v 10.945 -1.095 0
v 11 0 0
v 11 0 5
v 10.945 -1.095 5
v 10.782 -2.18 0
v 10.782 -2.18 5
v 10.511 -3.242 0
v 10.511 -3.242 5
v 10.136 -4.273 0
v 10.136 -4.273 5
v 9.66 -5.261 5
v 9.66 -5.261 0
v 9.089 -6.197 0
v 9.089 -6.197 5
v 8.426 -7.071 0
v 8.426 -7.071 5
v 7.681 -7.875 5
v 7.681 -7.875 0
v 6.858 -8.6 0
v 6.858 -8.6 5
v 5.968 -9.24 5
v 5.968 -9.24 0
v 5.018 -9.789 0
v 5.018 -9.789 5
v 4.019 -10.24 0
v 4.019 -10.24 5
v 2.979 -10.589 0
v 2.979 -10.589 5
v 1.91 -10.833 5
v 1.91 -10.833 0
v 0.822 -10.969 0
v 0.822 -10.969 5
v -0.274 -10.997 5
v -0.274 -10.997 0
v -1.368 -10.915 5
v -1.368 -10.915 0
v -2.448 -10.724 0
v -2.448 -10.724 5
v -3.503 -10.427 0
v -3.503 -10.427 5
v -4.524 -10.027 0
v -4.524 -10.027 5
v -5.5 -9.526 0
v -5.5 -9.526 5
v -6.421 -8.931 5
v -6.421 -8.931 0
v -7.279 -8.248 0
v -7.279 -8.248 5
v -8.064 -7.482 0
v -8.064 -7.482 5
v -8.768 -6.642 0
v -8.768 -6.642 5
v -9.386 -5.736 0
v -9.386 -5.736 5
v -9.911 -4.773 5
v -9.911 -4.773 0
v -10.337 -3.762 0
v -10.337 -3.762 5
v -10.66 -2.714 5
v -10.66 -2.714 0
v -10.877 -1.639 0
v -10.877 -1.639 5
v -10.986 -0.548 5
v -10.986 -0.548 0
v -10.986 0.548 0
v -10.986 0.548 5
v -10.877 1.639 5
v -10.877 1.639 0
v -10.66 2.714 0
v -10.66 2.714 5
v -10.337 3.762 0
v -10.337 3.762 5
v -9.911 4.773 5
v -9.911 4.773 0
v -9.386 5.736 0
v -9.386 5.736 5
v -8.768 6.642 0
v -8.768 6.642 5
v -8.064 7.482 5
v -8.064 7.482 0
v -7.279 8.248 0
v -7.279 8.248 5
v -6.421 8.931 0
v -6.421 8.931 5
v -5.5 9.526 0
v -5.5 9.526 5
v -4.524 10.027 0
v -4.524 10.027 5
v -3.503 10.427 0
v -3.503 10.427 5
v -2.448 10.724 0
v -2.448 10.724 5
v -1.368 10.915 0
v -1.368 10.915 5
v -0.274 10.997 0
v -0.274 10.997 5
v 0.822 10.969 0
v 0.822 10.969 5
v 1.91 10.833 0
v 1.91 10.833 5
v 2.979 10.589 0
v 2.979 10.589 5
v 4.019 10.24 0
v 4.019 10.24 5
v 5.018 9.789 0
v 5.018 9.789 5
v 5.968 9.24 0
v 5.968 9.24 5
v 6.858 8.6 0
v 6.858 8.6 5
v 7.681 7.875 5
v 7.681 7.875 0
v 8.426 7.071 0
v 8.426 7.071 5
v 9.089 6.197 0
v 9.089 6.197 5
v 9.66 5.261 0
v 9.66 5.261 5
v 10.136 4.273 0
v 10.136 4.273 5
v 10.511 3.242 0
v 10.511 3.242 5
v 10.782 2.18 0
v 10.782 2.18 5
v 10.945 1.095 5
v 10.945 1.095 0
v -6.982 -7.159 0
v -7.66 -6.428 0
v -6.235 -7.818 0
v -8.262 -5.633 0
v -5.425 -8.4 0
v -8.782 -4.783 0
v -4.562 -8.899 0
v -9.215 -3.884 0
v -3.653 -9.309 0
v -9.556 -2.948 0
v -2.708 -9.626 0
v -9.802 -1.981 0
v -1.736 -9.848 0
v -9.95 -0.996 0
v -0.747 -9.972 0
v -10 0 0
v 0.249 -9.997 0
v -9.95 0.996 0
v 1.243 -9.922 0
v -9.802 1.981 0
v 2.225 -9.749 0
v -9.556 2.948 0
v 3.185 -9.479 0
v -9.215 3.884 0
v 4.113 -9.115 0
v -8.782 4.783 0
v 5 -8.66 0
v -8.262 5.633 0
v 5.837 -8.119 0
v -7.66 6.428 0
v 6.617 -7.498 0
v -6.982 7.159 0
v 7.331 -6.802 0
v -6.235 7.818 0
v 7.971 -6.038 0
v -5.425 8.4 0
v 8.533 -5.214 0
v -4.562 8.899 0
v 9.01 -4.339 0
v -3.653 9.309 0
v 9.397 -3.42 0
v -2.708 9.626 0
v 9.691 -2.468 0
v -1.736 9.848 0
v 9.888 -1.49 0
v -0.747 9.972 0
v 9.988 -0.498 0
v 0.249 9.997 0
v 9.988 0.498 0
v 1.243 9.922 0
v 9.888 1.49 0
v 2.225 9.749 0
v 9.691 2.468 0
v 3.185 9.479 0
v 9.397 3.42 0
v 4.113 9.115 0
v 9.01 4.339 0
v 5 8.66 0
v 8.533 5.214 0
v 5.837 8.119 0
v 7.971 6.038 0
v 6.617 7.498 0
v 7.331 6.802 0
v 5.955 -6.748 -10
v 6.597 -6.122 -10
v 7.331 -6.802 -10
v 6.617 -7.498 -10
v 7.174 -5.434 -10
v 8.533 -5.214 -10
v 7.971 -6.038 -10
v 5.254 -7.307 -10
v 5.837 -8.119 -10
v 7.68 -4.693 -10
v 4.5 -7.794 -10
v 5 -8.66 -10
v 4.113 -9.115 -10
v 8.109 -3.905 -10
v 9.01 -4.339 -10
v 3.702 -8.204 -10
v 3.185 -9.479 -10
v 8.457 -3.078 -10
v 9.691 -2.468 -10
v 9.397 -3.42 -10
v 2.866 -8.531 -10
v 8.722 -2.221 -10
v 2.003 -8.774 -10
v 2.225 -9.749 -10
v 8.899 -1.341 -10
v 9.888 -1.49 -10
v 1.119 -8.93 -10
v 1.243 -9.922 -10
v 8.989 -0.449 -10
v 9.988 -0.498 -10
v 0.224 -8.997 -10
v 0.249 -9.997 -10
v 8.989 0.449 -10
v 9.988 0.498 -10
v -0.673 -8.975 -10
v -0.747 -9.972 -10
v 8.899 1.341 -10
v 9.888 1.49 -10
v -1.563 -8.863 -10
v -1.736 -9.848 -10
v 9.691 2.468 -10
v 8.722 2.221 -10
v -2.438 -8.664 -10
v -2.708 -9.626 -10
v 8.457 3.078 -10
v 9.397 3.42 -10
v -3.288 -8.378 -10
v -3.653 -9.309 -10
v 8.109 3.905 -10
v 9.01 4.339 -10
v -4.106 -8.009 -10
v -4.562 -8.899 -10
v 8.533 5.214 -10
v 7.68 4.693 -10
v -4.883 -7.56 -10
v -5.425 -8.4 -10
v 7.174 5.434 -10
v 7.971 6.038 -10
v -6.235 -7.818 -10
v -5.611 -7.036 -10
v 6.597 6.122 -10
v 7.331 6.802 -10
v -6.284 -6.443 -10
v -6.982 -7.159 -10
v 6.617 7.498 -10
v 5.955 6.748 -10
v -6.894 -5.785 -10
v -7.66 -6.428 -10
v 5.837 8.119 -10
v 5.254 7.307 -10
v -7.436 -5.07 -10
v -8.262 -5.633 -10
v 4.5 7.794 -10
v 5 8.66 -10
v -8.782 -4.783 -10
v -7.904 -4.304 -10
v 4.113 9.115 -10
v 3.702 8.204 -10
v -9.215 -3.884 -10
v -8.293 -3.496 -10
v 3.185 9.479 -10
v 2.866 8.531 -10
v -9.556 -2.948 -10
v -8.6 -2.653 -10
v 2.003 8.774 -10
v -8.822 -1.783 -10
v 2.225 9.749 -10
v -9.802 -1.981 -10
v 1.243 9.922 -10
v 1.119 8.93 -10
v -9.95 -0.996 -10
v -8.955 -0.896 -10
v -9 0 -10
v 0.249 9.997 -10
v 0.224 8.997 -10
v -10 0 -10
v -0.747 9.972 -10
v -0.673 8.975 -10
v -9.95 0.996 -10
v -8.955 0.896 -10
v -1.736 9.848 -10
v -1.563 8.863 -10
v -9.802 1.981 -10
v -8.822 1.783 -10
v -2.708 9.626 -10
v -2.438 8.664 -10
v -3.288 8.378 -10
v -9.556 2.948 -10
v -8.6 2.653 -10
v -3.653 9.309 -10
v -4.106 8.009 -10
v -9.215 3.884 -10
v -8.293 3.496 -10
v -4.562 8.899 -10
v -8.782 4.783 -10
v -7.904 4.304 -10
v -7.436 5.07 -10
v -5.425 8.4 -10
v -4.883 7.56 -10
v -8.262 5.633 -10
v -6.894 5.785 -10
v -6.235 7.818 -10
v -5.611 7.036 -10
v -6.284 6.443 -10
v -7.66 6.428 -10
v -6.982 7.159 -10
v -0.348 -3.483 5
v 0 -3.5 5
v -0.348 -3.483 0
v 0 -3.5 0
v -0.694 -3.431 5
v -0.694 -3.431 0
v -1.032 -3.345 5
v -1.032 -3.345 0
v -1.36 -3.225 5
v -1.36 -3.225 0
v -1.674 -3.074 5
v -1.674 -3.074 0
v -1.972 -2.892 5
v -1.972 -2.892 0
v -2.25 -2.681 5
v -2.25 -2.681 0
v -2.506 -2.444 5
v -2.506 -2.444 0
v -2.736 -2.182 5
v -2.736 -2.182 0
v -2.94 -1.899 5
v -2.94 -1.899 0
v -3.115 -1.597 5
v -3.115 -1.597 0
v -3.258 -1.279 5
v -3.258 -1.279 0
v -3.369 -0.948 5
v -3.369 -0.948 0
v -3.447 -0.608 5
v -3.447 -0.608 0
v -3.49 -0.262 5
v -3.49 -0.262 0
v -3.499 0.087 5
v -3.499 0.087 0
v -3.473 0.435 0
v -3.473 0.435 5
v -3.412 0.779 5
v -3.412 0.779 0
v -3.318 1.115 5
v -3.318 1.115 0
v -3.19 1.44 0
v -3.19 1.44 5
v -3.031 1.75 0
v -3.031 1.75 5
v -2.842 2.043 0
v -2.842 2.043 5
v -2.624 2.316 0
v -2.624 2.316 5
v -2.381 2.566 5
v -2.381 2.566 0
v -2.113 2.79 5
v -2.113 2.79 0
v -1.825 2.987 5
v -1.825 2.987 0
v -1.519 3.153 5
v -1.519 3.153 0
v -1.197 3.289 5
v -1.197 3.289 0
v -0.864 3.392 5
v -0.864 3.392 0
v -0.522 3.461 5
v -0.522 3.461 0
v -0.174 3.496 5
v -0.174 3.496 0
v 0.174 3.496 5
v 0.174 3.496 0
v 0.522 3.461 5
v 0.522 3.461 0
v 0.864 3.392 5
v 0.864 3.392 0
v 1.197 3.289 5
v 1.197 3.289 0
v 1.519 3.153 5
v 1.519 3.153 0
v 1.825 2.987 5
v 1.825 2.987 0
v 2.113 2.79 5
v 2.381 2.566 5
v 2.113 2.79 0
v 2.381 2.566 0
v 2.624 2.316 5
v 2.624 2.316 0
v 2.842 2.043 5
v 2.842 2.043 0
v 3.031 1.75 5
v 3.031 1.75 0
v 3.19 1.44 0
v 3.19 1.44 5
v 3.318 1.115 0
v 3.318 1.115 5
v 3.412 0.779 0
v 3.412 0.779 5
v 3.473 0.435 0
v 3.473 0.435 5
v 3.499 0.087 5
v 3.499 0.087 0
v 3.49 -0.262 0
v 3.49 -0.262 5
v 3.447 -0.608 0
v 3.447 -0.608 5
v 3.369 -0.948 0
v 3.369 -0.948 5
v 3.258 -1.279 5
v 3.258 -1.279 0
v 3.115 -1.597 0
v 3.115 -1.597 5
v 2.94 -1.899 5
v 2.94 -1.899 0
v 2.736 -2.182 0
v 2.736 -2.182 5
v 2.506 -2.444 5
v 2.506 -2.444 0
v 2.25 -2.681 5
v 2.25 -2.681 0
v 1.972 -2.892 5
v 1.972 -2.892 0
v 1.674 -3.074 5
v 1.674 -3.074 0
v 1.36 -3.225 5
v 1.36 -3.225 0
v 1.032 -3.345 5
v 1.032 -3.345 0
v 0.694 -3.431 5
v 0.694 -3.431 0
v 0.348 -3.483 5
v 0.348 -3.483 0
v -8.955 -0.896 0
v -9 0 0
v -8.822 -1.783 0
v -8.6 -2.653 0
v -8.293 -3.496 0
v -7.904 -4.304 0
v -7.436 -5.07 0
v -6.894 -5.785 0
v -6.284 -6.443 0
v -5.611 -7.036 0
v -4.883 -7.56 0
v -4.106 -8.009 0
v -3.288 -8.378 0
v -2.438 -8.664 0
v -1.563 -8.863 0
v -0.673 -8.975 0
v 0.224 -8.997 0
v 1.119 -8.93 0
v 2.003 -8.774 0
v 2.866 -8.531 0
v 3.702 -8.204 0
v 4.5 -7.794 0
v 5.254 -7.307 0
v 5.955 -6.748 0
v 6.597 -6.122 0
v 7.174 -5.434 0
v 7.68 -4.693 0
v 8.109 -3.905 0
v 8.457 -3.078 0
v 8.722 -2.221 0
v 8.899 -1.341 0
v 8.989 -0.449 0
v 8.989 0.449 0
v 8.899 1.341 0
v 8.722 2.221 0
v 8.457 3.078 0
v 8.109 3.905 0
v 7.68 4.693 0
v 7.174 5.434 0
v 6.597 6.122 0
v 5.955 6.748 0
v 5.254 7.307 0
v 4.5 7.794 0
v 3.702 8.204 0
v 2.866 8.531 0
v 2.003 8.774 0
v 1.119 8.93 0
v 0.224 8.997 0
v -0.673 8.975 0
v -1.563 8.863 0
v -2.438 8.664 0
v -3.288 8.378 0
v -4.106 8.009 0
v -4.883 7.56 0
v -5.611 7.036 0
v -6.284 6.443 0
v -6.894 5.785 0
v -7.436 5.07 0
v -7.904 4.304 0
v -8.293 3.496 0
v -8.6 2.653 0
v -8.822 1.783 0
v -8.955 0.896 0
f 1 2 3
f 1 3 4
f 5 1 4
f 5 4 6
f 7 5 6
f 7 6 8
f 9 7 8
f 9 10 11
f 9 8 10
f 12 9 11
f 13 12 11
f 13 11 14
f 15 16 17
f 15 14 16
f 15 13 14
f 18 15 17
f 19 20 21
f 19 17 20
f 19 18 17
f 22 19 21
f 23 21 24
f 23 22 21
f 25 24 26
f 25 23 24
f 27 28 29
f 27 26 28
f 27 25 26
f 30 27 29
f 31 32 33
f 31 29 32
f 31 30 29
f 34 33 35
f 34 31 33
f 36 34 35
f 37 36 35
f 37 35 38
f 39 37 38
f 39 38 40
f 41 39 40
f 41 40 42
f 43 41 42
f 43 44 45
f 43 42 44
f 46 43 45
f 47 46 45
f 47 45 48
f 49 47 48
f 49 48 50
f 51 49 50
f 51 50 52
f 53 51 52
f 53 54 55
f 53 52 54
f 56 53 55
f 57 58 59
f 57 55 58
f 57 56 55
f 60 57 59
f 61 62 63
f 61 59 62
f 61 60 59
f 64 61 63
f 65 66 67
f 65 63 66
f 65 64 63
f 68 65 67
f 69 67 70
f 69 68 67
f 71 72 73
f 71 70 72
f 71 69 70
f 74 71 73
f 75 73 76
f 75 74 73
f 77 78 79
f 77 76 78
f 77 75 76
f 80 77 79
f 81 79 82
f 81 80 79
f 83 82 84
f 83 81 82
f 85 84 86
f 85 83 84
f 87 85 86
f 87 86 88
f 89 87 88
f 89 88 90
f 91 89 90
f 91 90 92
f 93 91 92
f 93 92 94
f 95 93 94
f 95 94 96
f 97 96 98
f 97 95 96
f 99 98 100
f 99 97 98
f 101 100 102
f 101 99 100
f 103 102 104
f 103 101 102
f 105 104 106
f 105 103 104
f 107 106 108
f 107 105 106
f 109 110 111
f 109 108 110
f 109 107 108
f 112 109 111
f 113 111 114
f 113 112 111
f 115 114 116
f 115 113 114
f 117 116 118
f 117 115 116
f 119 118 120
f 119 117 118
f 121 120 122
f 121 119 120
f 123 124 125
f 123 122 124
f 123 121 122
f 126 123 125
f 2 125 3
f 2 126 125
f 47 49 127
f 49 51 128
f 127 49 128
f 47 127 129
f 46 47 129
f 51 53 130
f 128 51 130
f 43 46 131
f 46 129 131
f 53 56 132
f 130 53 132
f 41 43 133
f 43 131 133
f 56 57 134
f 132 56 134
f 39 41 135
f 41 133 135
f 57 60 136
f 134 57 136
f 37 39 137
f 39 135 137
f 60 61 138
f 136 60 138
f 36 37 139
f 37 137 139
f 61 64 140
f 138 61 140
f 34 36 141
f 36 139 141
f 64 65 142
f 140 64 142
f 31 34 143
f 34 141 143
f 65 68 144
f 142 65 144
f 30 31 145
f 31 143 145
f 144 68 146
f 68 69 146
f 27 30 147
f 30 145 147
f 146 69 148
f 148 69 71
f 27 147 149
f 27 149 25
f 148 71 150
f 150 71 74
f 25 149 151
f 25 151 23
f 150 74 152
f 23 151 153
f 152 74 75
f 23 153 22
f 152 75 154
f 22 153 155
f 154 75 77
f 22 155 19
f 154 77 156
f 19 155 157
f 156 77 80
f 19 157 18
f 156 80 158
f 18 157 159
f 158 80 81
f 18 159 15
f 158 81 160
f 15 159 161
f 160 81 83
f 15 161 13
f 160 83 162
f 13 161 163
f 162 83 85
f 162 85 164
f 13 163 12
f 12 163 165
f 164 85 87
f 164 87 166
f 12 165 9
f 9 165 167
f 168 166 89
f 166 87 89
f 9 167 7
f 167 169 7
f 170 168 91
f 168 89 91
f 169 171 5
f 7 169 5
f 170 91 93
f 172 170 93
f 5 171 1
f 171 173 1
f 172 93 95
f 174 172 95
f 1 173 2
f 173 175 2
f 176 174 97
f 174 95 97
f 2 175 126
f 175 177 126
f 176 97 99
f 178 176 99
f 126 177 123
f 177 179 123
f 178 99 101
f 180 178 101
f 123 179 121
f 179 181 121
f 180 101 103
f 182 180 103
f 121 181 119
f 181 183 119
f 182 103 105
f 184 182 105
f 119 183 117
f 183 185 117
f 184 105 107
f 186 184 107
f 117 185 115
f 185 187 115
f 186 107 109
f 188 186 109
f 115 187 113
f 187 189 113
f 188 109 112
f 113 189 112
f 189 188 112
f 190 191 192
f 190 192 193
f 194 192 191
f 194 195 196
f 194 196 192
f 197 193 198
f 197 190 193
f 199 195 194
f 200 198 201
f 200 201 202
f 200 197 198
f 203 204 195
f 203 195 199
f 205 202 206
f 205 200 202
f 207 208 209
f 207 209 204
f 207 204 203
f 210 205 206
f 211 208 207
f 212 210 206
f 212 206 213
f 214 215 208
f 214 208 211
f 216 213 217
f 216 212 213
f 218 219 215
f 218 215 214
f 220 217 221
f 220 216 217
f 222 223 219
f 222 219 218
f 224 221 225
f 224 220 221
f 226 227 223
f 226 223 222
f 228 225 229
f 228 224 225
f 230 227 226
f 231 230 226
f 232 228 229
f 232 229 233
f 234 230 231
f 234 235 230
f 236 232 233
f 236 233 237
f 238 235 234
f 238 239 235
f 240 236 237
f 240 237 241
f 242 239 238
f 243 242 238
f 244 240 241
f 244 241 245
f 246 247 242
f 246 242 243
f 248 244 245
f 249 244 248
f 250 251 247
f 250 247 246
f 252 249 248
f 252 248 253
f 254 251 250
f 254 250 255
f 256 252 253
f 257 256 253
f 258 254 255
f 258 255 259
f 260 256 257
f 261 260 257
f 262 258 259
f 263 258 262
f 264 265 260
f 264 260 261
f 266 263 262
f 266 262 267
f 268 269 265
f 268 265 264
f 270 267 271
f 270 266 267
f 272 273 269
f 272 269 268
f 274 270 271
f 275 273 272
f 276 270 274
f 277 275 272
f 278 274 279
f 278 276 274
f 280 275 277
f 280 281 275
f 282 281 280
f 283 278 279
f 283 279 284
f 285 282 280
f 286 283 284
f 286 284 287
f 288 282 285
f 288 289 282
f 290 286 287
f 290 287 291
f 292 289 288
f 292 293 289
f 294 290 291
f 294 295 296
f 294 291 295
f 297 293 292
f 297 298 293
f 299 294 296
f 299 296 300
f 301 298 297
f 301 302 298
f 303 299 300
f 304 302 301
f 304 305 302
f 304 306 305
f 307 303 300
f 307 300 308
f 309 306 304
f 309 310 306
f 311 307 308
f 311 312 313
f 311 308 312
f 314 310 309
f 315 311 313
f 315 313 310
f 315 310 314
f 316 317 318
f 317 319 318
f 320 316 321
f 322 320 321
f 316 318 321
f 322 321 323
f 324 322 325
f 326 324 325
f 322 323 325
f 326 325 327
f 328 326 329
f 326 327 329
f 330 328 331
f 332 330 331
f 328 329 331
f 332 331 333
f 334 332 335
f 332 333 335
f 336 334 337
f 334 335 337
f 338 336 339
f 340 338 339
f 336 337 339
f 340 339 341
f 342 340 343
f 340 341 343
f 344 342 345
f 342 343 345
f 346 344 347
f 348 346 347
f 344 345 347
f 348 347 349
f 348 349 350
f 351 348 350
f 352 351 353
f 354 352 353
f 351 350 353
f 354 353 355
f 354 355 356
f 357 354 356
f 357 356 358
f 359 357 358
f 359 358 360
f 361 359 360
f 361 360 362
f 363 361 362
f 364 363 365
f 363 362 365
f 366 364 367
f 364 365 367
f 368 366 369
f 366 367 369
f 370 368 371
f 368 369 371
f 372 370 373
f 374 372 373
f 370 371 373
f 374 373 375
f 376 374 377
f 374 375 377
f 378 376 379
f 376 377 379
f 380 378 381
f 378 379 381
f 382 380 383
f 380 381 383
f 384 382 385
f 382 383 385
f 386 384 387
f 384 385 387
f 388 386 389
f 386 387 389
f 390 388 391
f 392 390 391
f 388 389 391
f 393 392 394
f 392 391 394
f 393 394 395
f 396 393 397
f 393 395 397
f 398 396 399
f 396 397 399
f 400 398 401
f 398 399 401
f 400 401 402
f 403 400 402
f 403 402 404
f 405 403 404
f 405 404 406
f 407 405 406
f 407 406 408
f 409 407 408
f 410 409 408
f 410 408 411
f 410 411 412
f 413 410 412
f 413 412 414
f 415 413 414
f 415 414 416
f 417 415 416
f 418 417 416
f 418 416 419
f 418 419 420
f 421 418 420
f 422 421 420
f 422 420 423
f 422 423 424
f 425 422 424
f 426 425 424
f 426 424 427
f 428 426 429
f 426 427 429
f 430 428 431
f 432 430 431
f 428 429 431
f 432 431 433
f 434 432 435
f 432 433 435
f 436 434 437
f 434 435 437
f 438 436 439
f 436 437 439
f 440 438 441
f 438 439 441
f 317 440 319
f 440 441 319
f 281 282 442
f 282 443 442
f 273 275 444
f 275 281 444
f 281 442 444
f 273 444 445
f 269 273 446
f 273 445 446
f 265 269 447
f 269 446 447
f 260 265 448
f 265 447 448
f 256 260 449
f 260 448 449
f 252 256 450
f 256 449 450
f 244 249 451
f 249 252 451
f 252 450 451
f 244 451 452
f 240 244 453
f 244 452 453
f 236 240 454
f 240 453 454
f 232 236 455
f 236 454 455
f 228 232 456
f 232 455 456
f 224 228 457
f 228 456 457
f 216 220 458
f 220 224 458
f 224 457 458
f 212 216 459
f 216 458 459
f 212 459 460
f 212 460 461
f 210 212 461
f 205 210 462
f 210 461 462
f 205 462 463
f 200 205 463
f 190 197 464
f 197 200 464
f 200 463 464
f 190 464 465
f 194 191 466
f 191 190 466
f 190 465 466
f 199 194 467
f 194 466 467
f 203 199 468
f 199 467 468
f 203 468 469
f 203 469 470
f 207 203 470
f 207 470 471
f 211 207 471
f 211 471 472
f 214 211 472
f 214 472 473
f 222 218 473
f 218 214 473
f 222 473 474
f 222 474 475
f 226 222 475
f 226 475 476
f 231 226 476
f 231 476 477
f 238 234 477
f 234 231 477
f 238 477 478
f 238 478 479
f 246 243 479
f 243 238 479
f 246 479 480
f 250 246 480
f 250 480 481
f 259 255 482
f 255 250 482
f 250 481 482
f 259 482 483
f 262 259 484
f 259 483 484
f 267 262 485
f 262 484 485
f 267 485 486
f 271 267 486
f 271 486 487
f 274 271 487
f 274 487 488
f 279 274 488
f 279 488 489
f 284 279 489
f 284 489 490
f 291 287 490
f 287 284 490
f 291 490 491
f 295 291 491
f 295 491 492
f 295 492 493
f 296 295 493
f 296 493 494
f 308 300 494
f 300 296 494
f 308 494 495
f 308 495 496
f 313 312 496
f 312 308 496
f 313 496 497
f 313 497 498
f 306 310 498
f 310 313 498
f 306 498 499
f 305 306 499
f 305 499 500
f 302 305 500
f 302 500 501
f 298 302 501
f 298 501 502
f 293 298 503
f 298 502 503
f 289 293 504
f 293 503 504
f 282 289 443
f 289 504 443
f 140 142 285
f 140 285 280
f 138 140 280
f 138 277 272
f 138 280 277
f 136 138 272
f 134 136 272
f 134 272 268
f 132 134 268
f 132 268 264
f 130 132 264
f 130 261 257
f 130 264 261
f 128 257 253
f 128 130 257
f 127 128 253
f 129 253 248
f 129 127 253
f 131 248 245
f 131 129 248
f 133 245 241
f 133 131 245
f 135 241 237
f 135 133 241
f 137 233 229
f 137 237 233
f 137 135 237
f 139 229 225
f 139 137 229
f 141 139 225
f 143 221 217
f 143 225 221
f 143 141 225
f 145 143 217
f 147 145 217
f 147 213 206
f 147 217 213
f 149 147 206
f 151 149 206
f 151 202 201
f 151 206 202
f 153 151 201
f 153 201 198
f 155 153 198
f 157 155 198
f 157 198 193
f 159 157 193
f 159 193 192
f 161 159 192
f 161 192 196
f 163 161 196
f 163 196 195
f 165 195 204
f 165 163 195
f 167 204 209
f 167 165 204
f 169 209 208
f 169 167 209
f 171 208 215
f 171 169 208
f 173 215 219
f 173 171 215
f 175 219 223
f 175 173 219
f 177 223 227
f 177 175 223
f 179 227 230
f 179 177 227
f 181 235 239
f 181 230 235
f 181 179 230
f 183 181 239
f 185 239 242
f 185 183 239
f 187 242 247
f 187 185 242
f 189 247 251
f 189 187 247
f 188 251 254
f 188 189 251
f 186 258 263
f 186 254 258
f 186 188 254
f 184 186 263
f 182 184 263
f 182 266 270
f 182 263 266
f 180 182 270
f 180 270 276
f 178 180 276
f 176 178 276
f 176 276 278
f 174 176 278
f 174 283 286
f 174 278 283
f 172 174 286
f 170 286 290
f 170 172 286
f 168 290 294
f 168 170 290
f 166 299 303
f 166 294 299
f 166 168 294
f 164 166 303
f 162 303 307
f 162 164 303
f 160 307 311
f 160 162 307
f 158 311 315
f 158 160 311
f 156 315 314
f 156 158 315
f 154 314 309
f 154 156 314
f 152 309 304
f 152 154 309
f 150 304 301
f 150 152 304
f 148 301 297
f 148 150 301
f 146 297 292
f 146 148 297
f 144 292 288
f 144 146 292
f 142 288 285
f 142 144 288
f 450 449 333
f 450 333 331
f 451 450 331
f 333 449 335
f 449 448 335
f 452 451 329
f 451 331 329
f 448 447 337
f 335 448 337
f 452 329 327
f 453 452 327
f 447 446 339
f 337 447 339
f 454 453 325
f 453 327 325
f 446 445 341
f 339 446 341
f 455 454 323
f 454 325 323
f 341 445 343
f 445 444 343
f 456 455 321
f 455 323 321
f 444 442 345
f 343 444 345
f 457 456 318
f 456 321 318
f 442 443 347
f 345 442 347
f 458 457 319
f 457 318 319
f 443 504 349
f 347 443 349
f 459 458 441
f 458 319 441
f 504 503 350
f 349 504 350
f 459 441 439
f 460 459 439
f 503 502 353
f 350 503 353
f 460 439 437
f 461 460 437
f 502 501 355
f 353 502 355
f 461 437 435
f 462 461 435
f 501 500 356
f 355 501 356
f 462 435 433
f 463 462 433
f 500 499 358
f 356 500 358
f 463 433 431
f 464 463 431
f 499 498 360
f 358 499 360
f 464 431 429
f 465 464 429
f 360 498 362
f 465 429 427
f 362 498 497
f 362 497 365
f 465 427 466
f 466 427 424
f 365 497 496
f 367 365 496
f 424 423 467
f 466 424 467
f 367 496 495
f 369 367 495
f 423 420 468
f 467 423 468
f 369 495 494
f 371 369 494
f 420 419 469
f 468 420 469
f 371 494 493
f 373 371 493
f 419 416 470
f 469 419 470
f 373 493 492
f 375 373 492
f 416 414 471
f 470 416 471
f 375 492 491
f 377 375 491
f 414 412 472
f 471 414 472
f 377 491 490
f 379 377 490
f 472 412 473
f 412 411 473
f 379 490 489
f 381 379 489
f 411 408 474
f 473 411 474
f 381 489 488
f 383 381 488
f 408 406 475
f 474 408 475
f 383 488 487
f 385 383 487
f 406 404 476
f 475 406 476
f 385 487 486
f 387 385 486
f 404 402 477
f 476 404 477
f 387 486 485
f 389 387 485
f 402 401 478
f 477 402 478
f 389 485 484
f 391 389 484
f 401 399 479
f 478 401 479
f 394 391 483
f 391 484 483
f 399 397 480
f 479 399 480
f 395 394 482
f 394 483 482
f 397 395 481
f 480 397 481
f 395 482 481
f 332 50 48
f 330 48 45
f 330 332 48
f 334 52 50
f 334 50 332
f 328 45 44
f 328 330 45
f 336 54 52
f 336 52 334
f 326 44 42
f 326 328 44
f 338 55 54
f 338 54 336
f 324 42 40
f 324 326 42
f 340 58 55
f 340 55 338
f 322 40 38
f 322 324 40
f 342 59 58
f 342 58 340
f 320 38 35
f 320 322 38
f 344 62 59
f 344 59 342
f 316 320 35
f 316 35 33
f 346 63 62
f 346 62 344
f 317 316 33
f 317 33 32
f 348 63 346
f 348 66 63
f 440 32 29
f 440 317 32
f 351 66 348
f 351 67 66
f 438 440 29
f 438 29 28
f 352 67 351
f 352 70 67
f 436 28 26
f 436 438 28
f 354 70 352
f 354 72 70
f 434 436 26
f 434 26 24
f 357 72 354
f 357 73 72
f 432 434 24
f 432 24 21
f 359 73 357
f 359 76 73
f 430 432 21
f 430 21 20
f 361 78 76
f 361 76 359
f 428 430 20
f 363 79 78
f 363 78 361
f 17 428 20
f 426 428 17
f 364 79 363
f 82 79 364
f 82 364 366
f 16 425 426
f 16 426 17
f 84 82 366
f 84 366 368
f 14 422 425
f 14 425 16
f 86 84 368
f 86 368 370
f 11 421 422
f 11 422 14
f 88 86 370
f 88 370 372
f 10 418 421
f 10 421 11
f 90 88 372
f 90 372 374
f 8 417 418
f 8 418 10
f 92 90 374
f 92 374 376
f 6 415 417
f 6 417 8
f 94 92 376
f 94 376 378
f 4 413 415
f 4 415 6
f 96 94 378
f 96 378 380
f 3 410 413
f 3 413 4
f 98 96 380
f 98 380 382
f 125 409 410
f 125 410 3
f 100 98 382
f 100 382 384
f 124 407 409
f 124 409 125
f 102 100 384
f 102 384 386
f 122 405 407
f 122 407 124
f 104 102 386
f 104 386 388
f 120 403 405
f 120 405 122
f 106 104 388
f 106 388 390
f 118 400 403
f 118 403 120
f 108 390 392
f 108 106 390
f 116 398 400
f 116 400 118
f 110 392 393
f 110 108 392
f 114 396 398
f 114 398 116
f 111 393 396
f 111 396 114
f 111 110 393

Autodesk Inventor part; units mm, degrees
ref_plane "YZ Plane" through (0, 0, 0) normal (1, 0, 0) x (0, 1, 0)
ref_plane "XZ Plane" through (0, 0, 0) normal (0, 1, 0) x (-1, 0, 0)
ref_plane "XY Plane" through (0, 0, 0) normal (0, 0, 1) x (1, 0, 0)
sketch "Esboço1" plane through (0, 0, 0) normal (0, 0, 1) x (1, 0, 0)
  circle A0 centre (0, 0) radius 9 projected
  circle A1 centre (0, 0) radius 11
  point P0 (0, 0)
  dimension "d0" = 2
extrude "Extrusão1" add sketch "Esboço1" along normal blind 5 contours A0 | A1
sketch "Esboço2" plane through (0, 0, 0) normal (0, 0, -1) x (-1, 0, 0)
  circle A0 centre (0, 0) radius 9 projected
  circle A1 centre (0, 0) radius 10
  point P0 (0, 0)
  dimension "d3" = 1
extrude "Extrusão2" add sketch "Esboço2" along normal blind 10
hole "Furo1" at (0, 0, 5) direction (0, 0, -1) diameter 7 depth 8 tip angle 118
properties part number "Corpo Valvula Reguladora de Pressão"
